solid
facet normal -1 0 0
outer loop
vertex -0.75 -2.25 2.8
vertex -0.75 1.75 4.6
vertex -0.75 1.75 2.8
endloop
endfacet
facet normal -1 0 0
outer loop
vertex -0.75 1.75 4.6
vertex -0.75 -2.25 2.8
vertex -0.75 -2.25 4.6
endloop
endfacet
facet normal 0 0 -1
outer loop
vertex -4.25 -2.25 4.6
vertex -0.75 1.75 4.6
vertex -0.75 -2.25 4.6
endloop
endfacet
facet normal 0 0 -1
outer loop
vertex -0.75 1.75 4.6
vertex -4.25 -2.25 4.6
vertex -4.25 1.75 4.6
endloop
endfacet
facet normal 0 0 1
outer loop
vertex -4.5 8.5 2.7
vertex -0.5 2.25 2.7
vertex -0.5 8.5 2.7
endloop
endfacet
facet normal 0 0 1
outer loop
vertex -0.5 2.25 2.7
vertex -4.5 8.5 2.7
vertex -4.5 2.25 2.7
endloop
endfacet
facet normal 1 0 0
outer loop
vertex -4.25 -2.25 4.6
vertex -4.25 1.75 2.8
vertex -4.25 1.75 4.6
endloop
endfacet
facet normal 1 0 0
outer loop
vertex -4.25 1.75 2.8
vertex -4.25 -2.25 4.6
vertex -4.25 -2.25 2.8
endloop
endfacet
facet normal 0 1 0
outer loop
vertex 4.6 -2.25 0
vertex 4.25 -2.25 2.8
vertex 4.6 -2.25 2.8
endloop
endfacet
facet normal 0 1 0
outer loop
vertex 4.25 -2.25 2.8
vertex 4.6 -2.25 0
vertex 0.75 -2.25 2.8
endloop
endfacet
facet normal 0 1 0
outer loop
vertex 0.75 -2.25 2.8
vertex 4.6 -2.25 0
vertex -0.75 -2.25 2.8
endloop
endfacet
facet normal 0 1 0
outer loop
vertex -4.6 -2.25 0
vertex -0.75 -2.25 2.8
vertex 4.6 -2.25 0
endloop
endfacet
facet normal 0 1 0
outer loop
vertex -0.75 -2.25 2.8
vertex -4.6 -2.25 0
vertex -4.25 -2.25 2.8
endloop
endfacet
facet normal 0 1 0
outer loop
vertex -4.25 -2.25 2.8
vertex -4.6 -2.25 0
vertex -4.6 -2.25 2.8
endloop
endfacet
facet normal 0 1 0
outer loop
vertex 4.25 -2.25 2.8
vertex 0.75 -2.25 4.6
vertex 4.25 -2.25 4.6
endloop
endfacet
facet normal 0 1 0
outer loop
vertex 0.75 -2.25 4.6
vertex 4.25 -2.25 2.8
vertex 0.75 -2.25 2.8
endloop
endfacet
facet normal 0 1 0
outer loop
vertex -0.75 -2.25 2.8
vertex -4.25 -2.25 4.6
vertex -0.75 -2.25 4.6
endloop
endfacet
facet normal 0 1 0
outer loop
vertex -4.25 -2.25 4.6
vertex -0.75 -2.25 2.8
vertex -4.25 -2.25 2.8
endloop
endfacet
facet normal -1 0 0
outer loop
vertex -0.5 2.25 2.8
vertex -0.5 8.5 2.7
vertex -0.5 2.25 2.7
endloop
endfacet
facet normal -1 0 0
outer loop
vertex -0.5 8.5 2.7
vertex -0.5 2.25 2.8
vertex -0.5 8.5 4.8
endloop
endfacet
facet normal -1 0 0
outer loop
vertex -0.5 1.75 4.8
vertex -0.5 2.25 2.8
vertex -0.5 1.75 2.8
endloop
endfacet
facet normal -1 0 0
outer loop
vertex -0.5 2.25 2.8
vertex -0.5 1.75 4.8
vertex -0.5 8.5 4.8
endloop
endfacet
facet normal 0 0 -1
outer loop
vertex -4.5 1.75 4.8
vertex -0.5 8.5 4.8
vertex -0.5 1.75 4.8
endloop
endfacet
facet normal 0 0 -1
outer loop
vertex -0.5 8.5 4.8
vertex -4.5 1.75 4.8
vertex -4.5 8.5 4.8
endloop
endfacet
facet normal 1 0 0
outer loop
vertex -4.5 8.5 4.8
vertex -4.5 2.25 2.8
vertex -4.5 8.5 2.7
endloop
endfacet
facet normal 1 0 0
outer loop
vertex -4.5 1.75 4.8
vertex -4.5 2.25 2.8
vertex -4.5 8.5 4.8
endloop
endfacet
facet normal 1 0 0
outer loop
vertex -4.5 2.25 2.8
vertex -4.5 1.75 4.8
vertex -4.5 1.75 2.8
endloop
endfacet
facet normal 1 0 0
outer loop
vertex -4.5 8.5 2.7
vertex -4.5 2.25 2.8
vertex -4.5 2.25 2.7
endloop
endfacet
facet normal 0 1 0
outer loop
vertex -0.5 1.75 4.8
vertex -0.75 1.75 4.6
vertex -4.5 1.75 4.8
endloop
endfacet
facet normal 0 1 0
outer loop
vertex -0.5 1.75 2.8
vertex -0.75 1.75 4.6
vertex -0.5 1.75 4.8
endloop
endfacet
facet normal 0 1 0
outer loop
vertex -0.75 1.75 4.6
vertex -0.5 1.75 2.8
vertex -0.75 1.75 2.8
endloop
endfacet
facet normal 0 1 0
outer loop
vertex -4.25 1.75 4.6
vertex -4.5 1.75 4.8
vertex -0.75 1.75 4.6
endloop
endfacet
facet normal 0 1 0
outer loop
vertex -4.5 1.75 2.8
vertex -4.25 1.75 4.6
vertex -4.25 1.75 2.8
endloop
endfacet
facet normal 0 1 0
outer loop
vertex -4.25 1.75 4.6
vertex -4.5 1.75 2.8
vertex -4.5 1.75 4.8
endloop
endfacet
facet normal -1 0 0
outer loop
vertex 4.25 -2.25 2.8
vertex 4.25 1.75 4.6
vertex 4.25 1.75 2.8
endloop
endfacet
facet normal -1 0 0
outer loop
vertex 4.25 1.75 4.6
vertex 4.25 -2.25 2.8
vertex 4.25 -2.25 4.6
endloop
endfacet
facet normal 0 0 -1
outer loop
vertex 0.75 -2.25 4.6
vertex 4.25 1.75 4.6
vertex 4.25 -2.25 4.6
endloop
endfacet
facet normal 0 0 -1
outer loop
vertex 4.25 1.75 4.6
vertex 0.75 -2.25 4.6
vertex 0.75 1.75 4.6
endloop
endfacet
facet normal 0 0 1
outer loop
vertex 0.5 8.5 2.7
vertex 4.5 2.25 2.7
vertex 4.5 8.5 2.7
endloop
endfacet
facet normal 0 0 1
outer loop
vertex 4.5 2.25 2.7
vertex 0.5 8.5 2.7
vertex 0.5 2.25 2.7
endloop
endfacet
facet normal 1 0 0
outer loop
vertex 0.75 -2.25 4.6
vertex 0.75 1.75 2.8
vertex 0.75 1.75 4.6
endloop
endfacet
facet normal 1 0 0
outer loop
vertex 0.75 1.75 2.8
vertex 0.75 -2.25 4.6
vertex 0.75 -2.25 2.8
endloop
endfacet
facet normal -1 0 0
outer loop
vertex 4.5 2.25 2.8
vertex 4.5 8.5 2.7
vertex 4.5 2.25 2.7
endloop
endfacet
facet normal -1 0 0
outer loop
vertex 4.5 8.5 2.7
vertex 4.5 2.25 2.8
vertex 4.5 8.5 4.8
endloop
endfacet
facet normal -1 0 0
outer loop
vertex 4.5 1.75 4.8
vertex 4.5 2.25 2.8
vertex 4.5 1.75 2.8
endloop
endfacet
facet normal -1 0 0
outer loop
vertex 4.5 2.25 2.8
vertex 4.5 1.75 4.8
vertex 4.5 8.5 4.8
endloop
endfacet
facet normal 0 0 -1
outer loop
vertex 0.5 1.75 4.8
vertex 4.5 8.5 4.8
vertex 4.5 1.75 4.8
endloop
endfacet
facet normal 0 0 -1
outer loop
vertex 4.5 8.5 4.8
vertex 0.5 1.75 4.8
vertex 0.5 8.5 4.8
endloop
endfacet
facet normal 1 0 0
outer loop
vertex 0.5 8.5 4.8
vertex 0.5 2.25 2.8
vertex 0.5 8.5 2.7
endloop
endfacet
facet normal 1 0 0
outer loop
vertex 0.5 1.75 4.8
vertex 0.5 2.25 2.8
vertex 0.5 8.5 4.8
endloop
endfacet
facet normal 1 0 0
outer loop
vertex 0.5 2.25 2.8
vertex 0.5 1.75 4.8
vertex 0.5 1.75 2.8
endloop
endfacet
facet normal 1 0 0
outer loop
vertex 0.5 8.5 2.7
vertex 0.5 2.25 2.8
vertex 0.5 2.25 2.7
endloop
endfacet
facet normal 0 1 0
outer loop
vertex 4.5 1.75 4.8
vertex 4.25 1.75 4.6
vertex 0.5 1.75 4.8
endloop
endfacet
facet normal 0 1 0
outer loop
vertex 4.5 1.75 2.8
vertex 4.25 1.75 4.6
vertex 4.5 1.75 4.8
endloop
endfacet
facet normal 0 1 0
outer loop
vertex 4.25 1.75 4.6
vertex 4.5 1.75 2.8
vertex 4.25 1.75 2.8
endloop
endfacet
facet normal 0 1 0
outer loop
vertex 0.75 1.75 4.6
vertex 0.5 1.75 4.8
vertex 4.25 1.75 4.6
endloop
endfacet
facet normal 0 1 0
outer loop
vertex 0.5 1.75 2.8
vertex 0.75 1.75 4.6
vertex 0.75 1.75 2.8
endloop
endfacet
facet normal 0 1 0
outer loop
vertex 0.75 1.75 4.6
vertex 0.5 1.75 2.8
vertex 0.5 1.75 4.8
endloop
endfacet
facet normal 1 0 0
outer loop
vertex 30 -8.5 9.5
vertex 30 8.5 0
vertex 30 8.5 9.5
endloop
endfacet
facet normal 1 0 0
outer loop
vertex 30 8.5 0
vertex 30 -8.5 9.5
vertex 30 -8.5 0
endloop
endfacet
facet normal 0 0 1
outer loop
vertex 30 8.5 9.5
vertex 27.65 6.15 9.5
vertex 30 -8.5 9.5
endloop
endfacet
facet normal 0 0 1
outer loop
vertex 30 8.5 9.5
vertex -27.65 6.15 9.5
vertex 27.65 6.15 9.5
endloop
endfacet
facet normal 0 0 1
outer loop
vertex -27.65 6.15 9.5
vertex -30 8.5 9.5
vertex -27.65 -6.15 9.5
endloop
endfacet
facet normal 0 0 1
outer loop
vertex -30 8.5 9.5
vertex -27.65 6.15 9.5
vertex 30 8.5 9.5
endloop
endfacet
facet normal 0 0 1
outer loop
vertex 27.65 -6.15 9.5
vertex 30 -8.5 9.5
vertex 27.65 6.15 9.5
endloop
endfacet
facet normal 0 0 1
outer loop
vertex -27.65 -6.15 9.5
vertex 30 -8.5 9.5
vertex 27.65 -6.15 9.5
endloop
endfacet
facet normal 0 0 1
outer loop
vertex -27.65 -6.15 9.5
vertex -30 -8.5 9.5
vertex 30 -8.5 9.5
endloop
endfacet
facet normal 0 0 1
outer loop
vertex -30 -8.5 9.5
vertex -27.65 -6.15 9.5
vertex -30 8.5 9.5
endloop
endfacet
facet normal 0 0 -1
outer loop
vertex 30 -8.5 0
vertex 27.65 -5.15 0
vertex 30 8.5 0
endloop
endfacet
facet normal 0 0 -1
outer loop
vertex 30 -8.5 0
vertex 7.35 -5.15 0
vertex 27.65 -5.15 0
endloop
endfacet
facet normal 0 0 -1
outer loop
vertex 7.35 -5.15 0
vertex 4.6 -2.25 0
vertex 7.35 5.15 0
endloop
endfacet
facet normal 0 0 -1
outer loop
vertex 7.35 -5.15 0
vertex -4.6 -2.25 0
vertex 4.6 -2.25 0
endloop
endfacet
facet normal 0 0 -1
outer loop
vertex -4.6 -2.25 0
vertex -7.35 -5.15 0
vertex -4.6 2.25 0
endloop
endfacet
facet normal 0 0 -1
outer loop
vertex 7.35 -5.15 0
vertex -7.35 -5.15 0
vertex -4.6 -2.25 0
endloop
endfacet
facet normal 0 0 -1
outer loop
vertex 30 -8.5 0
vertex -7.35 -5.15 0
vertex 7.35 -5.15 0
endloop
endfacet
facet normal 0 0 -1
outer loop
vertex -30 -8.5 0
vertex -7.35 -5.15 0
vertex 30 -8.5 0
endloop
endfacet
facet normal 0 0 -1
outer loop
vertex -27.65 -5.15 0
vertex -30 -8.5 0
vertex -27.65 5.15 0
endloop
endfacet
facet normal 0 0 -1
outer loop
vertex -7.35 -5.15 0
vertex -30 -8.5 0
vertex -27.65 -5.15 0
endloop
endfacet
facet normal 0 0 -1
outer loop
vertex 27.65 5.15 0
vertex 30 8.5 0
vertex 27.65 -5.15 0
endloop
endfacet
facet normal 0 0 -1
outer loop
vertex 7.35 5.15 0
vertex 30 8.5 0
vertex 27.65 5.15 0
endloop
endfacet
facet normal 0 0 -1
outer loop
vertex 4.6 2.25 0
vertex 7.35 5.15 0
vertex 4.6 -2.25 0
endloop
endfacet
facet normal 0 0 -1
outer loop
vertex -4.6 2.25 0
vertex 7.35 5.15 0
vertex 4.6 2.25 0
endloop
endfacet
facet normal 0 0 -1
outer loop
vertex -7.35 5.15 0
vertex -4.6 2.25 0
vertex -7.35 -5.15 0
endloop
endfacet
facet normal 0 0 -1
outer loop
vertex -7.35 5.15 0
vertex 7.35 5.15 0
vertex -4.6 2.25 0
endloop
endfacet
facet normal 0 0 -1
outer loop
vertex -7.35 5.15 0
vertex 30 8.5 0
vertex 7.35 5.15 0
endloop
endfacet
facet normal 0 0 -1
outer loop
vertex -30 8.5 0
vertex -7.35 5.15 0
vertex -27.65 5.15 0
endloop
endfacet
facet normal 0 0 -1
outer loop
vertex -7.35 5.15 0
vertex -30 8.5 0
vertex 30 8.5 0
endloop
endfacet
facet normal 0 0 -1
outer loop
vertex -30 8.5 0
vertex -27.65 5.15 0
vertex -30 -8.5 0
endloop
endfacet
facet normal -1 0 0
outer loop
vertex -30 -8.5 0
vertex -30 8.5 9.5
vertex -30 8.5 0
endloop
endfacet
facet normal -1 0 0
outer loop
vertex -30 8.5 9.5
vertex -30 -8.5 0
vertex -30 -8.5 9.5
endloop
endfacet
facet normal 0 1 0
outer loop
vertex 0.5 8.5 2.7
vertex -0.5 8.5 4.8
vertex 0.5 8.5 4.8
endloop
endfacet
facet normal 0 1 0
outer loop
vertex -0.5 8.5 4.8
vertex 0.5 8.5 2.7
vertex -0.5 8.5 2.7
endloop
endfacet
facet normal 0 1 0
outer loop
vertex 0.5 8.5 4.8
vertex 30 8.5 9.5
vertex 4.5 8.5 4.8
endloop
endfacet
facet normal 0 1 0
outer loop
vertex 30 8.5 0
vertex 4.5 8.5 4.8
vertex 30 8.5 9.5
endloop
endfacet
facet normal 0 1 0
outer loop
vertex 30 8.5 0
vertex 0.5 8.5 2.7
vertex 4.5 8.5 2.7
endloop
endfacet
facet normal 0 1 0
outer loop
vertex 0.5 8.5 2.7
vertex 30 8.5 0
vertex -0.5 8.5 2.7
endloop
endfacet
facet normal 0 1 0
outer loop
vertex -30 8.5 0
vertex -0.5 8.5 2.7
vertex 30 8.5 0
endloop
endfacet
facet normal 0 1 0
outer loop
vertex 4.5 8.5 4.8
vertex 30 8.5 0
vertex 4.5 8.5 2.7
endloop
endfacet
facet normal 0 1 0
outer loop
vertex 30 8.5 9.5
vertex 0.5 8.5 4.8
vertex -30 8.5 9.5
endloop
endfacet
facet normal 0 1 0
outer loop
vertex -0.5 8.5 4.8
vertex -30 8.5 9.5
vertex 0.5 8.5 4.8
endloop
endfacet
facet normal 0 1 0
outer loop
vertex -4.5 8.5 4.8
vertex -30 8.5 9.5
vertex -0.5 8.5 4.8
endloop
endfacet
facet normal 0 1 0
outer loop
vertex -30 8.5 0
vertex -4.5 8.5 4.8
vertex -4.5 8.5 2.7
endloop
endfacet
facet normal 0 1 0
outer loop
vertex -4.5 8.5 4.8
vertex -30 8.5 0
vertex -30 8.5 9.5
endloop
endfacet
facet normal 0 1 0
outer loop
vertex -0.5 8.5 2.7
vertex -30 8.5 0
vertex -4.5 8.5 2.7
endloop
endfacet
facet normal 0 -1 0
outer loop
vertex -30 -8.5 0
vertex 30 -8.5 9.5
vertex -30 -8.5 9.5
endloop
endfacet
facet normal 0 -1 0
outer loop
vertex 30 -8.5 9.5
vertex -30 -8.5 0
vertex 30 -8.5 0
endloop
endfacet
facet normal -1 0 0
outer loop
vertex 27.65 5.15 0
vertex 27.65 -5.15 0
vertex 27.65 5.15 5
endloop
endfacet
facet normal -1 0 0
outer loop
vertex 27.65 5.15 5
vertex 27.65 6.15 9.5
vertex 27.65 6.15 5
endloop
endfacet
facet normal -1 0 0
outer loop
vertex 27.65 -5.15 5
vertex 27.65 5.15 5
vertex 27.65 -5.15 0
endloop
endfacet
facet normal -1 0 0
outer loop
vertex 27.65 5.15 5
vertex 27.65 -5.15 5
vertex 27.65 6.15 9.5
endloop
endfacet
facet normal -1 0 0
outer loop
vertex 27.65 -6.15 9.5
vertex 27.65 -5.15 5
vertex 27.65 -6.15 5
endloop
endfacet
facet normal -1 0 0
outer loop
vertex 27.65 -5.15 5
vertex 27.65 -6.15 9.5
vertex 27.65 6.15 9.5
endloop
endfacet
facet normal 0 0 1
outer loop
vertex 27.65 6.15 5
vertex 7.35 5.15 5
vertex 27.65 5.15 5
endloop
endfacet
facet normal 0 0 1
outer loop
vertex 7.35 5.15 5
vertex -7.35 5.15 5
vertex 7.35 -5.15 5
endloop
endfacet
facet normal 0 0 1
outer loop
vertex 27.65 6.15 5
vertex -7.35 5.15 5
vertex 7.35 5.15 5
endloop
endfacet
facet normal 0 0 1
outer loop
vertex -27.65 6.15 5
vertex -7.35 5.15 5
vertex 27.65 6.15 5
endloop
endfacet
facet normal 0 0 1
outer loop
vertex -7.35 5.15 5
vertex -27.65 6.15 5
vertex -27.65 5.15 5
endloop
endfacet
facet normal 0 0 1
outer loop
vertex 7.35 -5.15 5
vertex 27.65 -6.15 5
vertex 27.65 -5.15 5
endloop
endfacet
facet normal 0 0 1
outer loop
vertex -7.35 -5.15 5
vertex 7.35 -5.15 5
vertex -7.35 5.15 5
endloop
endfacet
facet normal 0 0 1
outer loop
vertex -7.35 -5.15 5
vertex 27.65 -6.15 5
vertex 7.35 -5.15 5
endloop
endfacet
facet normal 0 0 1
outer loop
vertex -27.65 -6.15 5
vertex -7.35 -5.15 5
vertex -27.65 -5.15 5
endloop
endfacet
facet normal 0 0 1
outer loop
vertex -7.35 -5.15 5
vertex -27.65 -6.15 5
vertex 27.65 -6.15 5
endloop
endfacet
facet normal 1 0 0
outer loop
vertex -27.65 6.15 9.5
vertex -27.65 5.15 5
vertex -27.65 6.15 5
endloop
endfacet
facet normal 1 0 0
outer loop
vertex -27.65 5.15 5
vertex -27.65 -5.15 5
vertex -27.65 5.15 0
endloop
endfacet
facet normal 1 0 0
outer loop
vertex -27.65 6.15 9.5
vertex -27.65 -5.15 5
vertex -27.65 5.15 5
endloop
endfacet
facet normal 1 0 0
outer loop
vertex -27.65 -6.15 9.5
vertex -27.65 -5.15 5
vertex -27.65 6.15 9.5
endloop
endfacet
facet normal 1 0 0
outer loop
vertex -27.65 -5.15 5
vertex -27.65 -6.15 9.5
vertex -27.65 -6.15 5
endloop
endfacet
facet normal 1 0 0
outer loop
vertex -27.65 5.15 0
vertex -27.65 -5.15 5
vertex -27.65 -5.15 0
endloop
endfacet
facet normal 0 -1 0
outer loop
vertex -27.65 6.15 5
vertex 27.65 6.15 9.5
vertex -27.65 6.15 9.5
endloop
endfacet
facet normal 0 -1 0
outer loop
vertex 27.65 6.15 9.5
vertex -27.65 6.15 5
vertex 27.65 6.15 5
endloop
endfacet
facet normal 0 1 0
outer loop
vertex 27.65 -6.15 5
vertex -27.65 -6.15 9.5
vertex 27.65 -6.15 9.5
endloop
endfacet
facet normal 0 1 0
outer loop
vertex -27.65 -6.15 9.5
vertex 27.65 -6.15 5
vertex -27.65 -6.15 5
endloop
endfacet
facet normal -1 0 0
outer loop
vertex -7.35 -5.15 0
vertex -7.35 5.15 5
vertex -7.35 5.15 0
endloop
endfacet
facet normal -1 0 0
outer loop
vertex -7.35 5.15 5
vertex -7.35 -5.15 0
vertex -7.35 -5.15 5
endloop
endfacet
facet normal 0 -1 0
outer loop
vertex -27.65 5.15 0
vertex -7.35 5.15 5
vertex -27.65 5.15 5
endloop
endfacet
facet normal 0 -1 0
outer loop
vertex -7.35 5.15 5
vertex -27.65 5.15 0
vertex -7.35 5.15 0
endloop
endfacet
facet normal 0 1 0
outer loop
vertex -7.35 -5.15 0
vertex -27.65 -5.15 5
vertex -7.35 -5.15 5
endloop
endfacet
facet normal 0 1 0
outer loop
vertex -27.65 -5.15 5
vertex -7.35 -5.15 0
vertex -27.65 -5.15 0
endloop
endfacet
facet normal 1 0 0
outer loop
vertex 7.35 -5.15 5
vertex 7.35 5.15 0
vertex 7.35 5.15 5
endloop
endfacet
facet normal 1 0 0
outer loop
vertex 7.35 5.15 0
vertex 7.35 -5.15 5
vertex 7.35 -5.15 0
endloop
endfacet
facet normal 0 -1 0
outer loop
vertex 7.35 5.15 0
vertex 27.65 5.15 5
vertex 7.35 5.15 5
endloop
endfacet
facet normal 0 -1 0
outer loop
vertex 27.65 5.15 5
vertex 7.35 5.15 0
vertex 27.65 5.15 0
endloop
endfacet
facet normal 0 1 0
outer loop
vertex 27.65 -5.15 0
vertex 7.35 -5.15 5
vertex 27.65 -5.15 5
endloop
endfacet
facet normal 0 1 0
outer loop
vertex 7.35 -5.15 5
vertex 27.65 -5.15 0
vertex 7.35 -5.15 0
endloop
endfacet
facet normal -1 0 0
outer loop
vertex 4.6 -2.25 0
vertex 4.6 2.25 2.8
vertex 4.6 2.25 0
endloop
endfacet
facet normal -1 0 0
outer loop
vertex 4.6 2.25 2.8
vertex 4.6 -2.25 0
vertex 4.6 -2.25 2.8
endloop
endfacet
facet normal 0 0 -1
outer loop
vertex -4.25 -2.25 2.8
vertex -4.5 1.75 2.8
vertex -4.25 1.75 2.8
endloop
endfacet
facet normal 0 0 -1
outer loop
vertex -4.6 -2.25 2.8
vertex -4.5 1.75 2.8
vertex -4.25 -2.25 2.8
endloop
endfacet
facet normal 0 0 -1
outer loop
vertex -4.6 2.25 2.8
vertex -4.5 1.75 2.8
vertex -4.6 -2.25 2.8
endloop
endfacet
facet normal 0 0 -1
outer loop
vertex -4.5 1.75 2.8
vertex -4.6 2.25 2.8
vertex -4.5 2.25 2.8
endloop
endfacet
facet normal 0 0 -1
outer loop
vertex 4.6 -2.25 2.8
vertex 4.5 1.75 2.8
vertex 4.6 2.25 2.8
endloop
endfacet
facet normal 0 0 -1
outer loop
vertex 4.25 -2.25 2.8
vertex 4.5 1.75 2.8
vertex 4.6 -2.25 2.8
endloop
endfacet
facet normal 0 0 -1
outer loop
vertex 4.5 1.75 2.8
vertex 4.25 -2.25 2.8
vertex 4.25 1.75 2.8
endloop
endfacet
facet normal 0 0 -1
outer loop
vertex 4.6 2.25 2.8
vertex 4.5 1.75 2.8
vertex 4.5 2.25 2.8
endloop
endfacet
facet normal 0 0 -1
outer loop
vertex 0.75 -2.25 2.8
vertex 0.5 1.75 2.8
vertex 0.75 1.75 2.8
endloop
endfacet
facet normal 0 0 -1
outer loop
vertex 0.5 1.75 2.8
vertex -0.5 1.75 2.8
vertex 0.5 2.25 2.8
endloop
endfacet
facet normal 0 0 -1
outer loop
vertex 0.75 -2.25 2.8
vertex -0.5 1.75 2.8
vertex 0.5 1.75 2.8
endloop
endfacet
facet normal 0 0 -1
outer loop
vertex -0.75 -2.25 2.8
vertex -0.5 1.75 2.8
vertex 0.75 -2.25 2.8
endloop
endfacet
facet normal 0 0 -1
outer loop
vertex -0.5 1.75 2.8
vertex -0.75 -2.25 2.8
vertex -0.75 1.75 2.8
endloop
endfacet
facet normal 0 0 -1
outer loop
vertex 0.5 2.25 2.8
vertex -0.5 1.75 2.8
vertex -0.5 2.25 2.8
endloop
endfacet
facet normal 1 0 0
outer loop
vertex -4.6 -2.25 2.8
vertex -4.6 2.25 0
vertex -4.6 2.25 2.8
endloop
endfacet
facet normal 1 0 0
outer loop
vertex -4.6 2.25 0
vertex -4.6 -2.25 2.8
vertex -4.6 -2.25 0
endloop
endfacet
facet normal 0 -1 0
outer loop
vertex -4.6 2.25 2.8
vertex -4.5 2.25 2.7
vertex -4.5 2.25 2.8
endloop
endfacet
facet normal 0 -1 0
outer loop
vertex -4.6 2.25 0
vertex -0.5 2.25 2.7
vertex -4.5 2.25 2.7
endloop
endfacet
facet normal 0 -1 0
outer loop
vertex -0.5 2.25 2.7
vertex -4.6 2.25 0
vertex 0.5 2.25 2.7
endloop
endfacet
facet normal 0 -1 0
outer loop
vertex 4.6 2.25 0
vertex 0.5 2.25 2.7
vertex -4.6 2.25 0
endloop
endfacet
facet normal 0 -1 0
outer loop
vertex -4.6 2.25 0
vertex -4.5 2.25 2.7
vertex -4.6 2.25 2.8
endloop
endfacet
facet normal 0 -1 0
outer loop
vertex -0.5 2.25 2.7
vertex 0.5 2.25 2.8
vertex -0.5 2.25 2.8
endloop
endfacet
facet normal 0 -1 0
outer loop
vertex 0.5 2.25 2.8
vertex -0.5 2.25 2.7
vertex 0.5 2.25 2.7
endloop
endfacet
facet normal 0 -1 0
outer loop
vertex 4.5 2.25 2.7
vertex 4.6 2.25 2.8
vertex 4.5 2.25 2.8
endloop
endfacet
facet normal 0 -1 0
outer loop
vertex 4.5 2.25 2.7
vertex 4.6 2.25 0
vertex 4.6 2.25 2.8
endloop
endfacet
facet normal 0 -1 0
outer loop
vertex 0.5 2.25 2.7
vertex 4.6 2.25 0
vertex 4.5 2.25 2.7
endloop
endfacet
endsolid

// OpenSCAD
// =============================================================================
// OpenNDT Weld Inspector - Tier 1 Dual-Sensor MFL Gradiometer Probe Housing
// =============================================================================
// Material: Print in NON-MAGNETIC PLA, PETG, or ABS (0.2 mm layer height, 25%+ infill)
// Geometry:
//   - Mild Steel Yoke:   55 x 12 x 3 mm (top pocket at Z = mag_thick)
//   - 2x NdFeB Magnets:  20 x 10 x 5 mm each (15 mm center gap => 20 + 15 + 20 = 55 mm)
//   - 2x S49E Sensors:   Flat TO-92 face parallel to weld (Z = 2.7..4.3 mm, fits under 5 mm yoke)
//                        5.0 mm center-to-center axial spacing (4-6 mm spec)
//   - Open magnet bottoms so poles contact workpiece through thin Kapton/PTFE tape
// =============================================================================

/* [Print & Component Tolerances] */
tol = 0.30;               // XY fit clearance for 3D printing (mm)

/* [Yoke Dimensions (Mild Steel)] */
yoke_len   = 55.0;        // X axis
yoke_wid   = 12.0;        // Y axis
yoke_thick = 3.0;         // Z axis

/* [Magnet Dimensions (NdFeB N35)] */
mag_len    = 20.0;        // X axis
mag_wid    = 10.0;        // Y axis
mag_thick  = 5.0;         // Z axis (set to 10.0 if stacking 2x magnets per pole)
air_gap    = 15.0;        // Distance between inner faces of Magnet 1 & Magnet 2

/* [Dual S49E Hall Sensor Gradiometer] */
sensor_spacing = 5.0;     // Center-to-center axial spacing (4-6 mm spec)
sensor_liftoff = 2.7;     // Recess above bottom plane of magnets (2.5-3.0 mm spec)
to92_w         = 4.2;     // TO-92 body width (along Y)
to92_h         = 3.2;     // TO-92 body length (along X)
to92_t         = 1.6;     // TO-92 body thickness (along Z, flat face down)

/* [Housing Shell] */
wall       = 2.5;         // Outer wall thickness
yoke_lip   = 1.5;         // Top retention rim height around steel yoke

total_len  = yoke_len + 2 * wall;
total_wid  = yoke_wid + 2 * wall;
total_h    = mag_thick + yoke_thick + yoke_lip;

module s49e_flat_slot() {
    // Flat TO-92 pocket (sensing face parallel to weld surface, leads exiting +Y)
    translate([-(to92_h + tol)/2, -(to92_w + tol)/2, 0])
        cube([to92_h + tol, to92_w + tol, to92_t + 0.3]);

    // 3-pin lead channel exiting out the +Y side wall below the steel yoke
    translate([-2.0, (to92_w + tol)/2 - 0.5, 0])
        cube([4.0, total_wid/2 + 2.0, to92_t + 0.5]);
}

module probe_housing() {
    difference() {
        // 1. Main outer housing block
        translate([-total_len/2, -total_wid/2, 0])
            cube([total_len, total_wid, total_h]);

        // 2. Top pocket for Mild Steel Backing Yoke (55 x 12 x 3 mm)
        translate([-(yoke_len + tol)/2, -(yoke_wid + tol)/2, mag_thick])
            cube([yoke_len + tol, yoke_wid + tol, yoke_thick + yoke_lip + 1.0]);

        // 3. Left Magnet Pocket (open at bottom & open to yoke at top)
        translate([-(air_gap/2 + mag_len + tol/2), -(mag_wid + tol)/2, -0.5])
            cube([mag_len + tol, mag_wid + tol, mag_thick + 1.0]);

        // 4. Right Magnet Pocket (open at bottom & open to yoke at top)
        translate([air_gap/2 - tol/2, -(mag_wid + tol)/2, -0.5])
            cube([mag_len + tol, mag_wid + tol, mag_thick + 1.0]);

        // 5. Central Sensor 1 Slot (GP26) - recessed by sensor_liftoff (2.7 mm)
        translate([-sensor_spacing/2, 0, sensor_liftoff])
            s49e_flat_slot();

        // 6. Central Sensor 2 Slot (GP27) - recessed by sensor_liftoff (2.7 mm)
        translate([sensor_spacing/2, 0, sensor_liftoff])
            s49e_flat_slot();

        // 7. Bottom sensing window under the two sensors (open down to Z=0)
        translate([-(sensor_spacing + to92_h)/2 - 0.5, -(to92_w + tol)/2, -0.5])
            cube([sensor_spacing + to92_h + 1.0, to92_w + tol, sensor_liftoff + 0.6]);
    }
}

probe_housing();
